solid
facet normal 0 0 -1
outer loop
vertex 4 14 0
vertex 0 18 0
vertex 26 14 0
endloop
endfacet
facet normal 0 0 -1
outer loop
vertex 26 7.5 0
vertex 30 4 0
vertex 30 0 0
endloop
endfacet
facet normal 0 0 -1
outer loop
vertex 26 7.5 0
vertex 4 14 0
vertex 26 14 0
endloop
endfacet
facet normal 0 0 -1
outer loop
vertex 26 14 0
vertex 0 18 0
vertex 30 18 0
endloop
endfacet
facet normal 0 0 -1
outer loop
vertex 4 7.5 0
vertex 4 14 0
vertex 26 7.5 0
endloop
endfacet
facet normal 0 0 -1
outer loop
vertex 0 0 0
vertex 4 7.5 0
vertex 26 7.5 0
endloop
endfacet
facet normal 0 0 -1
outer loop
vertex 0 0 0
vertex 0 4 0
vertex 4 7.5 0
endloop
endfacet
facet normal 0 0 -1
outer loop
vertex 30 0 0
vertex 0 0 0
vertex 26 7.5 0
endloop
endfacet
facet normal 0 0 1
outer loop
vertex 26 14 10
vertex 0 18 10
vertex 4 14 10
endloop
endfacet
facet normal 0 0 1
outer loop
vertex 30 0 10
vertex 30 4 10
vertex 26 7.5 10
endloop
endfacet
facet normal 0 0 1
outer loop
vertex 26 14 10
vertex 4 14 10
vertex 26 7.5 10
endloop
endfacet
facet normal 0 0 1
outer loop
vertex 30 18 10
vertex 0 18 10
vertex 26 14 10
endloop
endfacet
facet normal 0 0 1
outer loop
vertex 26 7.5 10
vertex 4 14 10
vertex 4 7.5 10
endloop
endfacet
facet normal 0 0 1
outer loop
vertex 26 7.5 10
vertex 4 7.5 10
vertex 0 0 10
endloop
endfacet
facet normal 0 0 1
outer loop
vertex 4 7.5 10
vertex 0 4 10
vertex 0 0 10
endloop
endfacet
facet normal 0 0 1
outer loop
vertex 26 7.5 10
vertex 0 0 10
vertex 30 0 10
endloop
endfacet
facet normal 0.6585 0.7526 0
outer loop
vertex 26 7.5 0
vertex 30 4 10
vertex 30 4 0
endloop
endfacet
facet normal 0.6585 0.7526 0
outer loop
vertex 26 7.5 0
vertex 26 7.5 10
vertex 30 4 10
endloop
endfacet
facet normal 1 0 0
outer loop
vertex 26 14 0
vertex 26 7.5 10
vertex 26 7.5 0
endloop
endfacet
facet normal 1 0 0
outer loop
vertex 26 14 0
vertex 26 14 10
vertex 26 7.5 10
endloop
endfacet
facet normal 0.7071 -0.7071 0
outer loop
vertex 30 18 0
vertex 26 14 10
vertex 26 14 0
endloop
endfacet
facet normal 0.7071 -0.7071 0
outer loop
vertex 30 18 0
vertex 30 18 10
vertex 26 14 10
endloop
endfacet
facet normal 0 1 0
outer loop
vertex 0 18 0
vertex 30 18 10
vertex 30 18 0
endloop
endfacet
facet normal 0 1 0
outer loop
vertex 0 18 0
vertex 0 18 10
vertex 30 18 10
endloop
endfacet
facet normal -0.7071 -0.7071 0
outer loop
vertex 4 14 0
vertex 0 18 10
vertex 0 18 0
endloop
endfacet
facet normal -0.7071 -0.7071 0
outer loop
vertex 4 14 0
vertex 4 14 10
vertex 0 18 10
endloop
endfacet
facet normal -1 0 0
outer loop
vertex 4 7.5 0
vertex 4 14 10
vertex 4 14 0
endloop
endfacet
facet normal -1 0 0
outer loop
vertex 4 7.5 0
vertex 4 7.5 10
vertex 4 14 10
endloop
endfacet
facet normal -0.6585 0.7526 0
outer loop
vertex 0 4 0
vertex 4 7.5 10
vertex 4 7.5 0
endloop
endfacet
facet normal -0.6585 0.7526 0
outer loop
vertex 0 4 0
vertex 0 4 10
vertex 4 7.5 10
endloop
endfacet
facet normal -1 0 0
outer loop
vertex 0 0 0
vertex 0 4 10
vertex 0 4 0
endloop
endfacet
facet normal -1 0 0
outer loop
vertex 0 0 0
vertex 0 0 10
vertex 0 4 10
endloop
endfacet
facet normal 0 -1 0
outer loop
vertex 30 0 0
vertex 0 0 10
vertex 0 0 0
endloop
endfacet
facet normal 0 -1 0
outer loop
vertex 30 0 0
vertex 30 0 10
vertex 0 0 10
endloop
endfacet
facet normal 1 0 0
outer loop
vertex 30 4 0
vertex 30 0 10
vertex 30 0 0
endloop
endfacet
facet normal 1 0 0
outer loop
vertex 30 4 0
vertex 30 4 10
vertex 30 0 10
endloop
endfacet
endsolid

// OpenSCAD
$fn = 32;

// ----------------------------------------------------------------------
// Key bar: dovetail key, 10 mm thick
// ----------------------------------------------------------------------

// --- parameters (mm) ---
profile_height = 10;      // extrusion height
profile_points = 10;      // points of the closed outline

profile = [[0, 0], [30, 0], [30, 4], [26, 7.5], [26, 14], [30, 18], [0, 18], [4, 14], [4, 7.5], [0, 4]];  // single closed polygon, 10 points, counter clockwise

// --- the one profile operation ---
linear_extrude(height = profile_height) polygon(points = profile);
